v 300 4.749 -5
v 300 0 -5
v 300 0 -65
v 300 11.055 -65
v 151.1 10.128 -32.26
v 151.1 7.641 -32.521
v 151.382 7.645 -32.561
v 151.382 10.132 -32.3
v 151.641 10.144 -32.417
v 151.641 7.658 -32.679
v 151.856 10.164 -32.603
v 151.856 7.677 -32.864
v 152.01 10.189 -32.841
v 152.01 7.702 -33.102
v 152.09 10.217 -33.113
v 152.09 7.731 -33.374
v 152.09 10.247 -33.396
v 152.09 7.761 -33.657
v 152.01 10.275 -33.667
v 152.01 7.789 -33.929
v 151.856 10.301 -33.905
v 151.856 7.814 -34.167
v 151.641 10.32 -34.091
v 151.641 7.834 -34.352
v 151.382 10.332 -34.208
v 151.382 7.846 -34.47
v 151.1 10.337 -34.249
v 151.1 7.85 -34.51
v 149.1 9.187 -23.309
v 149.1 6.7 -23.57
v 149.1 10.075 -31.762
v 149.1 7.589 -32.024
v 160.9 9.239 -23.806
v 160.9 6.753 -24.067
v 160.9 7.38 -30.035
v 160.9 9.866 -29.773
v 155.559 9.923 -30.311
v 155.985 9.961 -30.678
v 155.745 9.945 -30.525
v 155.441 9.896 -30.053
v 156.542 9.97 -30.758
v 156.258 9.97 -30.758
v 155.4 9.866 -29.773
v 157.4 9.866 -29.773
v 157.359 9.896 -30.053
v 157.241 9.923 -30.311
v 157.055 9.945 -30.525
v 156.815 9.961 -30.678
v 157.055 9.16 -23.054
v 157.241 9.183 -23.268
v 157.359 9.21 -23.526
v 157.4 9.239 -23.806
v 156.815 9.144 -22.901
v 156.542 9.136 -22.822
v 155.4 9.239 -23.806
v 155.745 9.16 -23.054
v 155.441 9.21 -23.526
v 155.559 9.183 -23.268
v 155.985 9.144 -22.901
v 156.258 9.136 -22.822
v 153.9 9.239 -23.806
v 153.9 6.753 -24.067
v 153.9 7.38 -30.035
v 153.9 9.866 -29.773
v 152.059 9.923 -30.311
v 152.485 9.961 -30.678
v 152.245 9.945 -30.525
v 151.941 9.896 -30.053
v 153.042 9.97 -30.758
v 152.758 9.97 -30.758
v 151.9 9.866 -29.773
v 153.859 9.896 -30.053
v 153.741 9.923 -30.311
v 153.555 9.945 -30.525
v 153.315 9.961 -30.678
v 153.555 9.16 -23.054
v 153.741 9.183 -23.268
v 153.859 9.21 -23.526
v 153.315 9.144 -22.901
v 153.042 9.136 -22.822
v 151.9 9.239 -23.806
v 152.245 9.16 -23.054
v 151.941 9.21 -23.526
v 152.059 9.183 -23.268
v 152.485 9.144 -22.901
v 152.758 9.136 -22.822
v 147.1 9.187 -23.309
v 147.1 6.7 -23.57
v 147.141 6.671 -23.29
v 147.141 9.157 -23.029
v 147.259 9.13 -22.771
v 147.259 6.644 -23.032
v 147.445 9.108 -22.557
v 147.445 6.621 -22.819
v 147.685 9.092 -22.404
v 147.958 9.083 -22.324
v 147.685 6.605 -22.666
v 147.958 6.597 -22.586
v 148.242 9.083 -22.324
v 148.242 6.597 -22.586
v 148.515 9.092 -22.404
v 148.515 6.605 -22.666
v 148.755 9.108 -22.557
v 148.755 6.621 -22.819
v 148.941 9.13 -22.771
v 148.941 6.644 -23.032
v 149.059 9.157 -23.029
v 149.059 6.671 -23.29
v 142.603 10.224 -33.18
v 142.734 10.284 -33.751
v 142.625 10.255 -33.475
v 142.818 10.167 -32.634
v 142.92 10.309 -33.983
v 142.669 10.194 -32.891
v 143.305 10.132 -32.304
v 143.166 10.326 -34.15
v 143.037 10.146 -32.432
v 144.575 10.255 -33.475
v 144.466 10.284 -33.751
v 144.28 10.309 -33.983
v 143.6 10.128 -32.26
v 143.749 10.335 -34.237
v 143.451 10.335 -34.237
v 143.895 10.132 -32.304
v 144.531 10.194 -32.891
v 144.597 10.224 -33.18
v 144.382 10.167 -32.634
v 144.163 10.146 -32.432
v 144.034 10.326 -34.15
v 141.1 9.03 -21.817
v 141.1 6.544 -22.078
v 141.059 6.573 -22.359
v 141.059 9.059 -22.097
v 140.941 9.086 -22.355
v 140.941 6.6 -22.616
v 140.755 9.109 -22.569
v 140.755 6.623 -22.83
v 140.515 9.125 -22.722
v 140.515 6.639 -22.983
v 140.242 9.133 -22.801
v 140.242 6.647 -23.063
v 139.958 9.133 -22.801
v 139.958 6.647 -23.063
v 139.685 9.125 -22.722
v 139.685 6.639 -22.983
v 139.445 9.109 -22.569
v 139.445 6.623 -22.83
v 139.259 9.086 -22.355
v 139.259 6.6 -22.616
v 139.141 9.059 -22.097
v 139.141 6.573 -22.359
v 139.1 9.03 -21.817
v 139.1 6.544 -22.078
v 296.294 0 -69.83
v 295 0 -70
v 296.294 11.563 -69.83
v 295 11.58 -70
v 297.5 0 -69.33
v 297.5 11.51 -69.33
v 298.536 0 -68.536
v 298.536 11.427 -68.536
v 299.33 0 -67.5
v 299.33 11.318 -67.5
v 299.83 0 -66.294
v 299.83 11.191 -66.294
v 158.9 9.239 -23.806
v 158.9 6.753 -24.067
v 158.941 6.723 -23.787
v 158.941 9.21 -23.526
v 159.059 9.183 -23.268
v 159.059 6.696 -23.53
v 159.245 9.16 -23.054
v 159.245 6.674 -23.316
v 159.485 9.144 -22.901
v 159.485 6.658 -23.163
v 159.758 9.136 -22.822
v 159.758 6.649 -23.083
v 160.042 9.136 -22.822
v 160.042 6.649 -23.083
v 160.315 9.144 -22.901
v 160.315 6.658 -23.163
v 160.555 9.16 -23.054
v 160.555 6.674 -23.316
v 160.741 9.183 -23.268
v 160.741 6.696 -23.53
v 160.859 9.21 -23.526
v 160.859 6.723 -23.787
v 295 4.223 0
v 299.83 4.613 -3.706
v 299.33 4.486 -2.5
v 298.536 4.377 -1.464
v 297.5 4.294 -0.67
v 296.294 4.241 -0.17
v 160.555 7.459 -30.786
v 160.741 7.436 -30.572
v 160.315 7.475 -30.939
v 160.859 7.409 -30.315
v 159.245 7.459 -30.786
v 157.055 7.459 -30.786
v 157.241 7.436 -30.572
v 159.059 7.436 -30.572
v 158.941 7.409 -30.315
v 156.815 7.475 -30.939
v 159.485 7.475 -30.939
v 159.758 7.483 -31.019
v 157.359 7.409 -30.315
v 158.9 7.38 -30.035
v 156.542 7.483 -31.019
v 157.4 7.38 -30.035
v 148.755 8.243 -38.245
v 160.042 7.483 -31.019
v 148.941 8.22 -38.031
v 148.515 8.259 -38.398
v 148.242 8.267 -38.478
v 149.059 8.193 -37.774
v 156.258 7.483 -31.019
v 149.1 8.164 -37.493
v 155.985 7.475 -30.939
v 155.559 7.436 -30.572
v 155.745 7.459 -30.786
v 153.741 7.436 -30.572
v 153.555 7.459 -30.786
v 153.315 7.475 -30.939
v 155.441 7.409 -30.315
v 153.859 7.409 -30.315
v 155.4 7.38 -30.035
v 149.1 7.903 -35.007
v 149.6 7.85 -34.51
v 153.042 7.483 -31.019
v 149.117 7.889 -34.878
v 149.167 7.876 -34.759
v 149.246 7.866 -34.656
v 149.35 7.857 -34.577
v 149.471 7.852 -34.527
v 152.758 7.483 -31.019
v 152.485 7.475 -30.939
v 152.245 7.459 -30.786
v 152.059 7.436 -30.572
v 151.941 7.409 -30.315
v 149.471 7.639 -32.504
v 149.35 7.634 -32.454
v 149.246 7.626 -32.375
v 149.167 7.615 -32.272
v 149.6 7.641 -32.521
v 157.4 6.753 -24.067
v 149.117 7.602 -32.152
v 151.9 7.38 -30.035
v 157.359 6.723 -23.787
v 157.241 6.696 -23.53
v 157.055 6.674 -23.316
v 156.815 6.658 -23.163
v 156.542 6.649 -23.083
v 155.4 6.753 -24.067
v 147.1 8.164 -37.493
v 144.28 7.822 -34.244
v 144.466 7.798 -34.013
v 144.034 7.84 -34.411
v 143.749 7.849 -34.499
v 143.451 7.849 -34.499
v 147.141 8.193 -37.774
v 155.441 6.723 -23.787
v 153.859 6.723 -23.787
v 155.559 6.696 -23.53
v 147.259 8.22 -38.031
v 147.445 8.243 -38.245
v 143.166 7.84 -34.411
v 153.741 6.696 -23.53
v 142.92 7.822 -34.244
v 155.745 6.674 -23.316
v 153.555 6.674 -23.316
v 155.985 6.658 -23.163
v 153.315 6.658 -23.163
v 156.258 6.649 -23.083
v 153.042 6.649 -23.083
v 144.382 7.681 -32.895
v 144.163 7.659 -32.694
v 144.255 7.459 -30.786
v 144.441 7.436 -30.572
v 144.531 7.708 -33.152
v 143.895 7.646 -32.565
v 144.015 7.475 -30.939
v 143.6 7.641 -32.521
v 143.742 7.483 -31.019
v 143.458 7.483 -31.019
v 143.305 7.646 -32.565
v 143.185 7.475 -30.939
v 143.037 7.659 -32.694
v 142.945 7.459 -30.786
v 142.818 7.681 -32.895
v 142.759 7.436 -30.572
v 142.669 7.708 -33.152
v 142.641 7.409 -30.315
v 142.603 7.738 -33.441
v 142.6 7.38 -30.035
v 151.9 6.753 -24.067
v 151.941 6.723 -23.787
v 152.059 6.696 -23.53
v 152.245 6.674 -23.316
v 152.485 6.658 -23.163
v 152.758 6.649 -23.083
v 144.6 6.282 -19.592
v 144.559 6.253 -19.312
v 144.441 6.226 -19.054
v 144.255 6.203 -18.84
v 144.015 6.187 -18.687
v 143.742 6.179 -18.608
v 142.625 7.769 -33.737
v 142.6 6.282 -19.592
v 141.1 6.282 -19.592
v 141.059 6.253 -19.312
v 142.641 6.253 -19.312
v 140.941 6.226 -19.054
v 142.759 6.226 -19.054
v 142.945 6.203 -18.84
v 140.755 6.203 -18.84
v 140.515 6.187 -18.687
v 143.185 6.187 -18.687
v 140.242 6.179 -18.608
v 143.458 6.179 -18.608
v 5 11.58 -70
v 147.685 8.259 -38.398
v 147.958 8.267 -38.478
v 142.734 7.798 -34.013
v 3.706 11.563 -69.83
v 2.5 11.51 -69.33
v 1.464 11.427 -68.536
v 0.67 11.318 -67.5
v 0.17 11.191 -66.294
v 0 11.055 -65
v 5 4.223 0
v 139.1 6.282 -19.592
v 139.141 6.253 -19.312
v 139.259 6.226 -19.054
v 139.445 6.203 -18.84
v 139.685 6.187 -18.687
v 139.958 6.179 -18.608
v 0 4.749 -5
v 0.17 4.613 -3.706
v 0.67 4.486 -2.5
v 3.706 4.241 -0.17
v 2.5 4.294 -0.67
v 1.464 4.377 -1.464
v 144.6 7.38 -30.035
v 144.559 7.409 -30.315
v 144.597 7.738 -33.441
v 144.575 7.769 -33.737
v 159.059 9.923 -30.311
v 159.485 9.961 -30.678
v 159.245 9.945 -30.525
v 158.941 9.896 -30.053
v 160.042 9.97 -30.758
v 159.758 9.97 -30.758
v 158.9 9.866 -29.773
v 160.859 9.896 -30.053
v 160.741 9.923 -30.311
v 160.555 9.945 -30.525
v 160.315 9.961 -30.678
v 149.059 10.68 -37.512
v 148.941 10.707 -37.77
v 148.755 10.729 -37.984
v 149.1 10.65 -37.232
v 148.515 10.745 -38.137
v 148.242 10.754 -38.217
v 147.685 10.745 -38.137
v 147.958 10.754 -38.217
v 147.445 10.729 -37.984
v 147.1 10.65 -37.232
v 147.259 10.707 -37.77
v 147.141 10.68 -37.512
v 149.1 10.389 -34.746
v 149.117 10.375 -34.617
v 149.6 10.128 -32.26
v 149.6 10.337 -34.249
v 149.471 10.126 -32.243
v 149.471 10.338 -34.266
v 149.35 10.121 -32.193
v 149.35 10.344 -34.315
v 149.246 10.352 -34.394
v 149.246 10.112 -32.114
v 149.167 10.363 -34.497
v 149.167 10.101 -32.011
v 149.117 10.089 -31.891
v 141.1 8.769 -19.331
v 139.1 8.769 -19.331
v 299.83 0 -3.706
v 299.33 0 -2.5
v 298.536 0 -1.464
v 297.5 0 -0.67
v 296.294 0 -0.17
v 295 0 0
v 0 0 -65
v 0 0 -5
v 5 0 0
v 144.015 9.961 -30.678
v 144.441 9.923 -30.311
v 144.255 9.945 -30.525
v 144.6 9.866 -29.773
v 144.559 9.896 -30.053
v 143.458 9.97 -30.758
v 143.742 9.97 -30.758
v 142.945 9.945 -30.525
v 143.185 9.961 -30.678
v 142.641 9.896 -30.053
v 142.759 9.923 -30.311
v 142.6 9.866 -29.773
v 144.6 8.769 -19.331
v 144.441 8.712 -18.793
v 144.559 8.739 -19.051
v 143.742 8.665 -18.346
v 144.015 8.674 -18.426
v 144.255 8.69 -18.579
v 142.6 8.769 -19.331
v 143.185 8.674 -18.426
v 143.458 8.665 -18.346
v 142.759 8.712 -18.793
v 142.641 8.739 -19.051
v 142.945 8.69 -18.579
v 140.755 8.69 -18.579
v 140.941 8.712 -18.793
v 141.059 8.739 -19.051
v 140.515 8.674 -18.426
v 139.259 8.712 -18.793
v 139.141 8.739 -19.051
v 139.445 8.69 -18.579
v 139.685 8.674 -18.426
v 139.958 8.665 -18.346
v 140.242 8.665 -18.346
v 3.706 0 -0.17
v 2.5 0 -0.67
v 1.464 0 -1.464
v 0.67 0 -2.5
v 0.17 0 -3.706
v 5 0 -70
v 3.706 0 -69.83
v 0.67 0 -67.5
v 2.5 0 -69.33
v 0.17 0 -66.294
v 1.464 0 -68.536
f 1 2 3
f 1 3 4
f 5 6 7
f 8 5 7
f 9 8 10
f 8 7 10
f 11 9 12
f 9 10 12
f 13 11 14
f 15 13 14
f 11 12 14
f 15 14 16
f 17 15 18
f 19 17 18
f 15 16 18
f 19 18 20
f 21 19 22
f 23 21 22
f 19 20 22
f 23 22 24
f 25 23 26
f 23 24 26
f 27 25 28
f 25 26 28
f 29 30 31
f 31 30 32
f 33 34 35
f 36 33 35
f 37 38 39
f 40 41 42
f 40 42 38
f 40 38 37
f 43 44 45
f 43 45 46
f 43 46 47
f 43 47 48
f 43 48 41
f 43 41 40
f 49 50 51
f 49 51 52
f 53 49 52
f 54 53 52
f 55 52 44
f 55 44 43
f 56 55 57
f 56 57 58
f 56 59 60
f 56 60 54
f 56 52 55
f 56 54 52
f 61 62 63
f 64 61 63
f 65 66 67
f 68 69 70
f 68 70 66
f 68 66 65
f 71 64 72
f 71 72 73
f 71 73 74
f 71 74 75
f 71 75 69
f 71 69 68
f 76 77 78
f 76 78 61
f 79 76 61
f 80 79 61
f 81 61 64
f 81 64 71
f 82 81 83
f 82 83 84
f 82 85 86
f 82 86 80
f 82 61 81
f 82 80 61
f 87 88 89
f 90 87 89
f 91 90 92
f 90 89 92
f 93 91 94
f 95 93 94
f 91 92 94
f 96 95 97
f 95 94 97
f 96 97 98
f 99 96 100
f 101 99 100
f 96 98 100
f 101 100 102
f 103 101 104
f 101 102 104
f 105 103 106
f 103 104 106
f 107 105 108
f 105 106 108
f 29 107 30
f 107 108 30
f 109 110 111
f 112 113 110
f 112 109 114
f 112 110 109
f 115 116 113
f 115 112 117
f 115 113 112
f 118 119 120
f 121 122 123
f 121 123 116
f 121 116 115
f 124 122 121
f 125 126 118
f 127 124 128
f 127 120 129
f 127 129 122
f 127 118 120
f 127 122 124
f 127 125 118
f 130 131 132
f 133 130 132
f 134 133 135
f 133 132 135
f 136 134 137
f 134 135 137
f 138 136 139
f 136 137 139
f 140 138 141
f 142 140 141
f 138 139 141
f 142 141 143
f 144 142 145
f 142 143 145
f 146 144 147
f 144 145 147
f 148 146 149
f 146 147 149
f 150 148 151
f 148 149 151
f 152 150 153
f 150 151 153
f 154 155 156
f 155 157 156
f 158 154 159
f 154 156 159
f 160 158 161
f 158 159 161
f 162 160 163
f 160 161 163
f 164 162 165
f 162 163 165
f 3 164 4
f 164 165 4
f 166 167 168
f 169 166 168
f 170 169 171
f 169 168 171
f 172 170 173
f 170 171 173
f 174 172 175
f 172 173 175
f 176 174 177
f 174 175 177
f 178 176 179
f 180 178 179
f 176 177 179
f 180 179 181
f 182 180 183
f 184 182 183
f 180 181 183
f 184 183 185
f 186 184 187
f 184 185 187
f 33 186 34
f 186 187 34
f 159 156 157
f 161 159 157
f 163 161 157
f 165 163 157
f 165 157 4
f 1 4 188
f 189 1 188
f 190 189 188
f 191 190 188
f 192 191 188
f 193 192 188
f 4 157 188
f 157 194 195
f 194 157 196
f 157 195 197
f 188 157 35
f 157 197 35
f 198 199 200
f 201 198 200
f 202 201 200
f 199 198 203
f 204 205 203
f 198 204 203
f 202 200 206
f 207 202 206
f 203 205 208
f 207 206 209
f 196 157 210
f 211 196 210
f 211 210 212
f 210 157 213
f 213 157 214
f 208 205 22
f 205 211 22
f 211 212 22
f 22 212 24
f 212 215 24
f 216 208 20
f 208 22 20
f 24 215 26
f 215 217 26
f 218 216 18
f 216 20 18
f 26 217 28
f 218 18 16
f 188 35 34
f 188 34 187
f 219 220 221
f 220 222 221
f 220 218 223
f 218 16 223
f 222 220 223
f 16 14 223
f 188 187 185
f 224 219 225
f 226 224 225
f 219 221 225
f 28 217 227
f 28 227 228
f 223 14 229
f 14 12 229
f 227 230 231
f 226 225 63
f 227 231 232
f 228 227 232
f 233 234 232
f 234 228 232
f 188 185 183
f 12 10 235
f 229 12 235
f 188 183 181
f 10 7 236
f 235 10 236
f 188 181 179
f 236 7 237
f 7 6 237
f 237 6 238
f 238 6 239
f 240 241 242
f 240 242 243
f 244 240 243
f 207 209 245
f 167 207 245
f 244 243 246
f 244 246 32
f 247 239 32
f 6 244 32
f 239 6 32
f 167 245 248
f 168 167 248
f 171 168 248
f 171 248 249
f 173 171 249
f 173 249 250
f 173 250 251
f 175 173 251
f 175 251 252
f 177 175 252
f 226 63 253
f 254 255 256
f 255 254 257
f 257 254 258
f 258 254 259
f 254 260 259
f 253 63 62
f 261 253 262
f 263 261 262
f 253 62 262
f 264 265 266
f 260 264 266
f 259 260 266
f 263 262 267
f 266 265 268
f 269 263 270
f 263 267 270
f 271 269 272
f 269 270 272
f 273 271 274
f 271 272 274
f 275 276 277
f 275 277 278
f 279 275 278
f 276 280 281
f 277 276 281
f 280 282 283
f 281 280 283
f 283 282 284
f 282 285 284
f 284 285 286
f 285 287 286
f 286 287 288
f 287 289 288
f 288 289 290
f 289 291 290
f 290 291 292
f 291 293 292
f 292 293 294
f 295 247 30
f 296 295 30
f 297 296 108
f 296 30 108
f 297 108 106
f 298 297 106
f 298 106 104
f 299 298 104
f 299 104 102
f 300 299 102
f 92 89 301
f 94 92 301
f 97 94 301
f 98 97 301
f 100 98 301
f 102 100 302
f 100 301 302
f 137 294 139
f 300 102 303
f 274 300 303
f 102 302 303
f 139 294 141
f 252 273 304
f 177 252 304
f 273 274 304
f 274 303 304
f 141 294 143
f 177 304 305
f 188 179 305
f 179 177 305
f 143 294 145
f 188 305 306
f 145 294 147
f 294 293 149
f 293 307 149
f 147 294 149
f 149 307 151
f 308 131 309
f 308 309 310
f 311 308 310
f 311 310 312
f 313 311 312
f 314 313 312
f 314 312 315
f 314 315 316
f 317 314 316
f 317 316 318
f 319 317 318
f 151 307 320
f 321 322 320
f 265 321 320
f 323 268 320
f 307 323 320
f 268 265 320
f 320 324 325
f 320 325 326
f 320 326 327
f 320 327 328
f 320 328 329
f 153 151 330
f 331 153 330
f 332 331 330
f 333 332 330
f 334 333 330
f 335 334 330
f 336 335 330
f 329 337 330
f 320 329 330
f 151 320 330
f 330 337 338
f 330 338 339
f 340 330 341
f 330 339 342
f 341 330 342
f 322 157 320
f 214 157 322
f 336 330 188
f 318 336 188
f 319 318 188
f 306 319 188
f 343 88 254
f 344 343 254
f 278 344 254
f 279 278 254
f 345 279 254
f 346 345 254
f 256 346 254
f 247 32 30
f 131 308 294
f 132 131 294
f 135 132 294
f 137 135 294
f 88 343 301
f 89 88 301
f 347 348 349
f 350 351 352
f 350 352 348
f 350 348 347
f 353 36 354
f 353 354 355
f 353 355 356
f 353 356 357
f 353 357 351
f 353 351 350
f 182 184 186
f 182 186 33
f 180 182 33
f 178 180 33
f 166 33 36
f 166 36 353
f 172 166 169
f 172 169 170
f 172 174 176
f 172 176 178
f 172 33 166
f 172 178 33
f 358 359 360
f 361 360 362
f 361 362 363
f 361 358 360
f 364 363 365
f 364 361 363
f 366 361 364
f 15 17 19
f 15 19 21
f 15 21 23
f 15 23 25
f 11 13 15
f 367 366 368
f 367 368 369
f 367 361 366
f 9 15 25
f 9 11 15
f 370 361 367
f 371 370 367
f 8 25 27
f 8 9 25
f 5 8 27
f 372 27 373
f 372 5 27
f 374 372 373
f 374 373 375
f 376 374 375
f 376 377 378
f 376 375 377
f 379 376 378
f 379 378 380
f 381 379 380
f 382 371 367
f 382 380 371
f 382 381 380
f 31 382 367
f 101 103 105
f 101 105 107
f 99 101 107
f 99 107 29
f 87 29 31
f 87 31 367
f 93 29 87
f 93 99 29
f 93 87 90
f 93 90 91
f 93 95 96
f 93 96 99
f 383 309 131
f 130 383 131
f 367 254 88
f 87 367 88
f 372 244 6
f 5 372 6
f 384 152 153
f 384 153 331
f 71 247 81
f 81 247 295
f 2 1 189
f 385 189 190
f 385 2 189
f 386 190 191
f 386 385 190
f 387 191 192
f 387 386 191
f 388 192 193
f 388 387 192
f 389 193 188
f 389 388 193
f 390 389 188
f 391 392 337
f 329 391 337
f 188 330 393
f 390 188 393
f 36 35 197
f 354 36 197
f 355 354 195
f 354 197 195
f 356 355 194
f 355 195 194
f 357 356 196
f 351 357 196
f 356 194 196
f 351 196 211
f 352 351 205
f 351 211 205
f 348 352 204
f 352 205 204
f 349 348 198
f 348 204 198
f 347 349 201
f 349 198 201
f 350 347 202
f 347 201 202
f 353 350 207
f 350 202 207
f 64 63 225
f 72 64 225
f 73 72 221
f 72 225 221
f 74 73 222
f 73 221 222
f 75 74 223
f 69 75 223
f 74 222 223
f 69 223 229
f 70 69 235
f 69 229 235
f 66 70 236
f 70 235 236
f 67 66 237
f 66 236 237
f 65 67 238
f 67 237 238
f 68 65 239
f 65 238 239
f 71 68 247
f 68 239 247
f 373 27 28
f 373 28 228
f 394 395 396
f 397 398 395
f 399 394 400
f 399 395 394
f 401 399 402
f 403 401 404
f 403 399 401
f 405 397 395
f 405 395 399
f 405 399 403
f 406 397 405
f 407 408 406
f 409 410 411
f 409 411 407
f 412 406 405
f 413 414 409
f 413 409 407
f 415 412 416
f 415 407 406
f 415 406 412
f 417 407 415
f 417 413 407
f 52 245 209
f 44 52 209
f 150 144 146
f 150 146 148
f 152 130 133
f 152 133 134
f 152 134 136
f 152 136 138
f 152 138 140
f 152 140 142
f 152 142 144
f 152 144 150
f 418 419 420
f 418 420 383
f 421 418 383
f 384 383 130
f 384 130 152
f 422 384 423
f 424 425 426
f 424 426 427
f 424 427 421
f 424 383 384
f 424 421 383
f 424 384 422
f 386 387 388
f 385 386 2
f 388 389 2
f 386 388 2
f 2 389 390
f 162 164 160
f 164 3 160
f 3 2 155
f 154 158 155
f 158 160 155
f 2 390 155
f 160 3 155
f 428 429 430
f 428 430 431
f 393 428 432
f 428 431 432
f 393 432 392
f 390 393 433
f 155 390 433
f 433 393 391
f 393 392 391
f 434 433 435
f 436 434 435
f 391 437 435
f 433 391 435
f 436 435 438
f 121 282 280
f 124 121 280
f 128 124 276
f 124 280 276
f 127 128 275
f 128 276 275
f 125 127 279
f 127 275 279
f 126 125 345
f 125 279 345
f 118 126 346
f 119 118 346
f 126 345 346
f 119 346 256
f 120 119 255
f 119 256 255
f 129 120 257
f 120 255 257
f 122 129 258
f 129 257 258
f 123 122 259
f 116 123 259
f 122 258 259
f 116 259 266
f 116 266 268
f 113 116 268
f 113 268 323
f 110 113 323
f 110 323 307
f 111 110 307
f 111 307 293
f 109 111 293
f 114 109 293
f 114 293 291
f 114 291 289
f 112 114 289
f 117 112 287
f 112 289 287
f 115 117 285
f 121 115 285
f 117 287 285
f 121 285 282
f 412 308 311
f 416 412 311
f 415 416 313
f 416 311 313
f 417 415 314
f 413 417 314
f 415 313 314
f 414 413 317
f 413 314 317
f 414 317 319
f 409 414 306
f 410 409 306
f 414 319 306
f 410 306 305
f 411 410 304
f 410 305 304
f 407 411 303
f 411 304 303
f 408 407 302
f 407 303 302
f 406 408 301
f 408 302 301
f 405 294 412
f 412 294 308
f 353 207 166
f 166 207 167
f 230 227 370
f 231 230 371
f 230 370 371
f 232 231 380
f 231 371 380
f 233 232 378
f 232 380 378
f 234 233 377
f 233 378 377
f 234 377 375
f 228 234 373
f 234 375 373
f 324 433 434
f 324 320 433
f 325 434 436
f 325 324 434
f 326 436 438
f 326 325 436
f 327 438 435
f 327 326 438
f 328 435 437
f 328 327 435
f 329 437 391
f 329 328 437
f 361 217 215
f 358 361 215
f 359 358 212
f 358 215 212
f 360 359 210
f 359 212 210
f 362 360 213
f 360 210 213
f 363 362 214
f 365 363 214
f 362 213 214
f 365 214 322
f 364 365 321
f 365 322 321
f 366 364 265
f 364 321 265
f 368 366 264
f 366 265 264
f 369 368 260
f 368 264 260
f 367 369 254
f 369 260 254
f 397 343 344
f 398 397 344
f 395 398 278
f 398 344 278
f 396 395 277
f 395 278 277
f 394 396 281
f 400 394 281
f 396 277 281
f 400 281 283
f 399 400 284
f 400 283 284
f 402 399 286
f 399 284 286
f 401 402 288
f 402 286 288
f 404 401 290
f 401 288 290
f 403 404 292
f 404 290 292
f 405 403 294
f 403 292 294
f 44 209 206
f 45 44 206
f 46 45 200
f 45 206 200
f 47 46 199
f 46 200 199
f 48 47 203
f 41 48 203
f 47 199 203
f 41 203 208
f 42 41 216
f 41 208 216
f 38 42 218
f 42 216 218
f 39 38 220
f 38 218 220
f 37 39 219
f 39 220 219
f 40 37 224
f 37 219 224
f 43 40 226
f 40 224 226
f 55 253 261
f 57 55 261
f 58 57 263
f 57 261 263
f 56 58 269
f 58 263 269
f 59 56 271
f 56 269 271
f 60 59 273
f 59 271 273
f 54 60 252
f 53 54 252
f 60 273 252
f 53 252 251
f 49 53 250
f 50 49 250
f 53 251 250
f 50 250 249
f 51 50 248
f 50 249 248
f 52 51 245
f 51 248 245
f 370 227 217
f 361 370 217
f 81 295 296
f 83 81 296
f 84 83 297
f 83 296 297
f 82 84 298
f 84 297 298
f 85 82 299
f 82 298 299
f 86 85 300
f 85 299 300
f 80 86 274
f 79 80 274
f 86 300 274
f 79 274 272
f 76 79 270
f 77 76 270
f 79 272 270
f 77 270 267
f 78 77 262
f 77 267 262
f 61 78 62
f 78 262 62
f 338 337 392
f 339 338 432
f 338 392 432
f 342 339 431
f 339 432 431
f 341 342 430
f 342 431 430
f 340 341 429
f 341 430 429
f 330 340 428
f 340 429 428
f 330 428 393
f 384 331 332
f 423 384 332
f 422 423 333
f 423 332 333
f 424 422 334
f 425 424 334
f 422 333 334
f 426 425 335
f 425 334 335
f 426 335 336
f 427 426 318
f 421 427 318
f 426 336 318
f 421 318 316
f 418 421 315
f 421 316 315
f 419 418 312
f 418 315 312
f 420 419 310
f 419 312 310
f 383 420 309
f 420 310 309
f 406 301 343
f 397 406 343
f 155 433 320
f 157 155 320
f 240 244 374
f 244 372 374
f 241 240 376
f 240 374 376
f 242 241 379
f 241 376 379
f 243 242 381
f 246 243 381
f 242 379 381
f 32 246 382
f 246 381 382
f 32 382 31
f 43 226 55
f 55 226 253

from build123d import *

# Parameters (mm, degrees)
BOSS_EXTRUDE1_REACH = 318.657
SKETCH1_W           = 300
SKETCH1_H           = 70
SKETCH2_R           = 1
BOSS_EXTRUDE2_DEPTH = 2.5
FILLET1_R           = 5
FILLET2_R           = 0.5


with BuildPart() as part:
    # Boss-Extrude1: up to this plane
    boss_extrude1_end = Plane(origin=(0, 4.176991961, 0.439019546), z_dir=(0, 0.9945218953682733, 0.10452846326765369))
    # Sketch1 → Boss-Extrude1 (new, up to the surface)
    with BuildSketch(Plane(origin=(0, 0, 0), x_dir=(1, 0, 0), z_dir=(0, 1, 0)), mode=Mode.PRIVATE) as boss_extrude1_sk1:
        with Locations((150, 35)):
            Rectangle(SKETCH1_W, SKETCH1_H)
    boss_extrude1_tool1 = split(extrude(boss_extrude1_sk1.sketch, amount=BOSS_EXTRUDE1_REACH, mode=Mode.PRIVATE), bisect_by=boss_extrude1_end, keep=Keep.BOTH, mode=Mode.PRIVATE)
    add(boss_extrude1_tool1.solids().sort_by_distance((150, 0, -35))[0])

    # Sketch2 → Boss-Extrude2 (add)
    with BuildSketch(Plane(origin=(0, 4.176991961, 0.439019546), x_dir=(-1, 0, 0), z_dir=(0, 0.9945218953682733, 0.10452846326765368))):
        with BuildLine():
            ThreePointArc((-149.1, -38.141437788), (-148.1, -39.141437788), (-147.1, -38.141437788))
            Line((-147.1, -38.141437788), (-147.1, -24.141437788))
            ThreePointArc((-147.1, -24.141437788), (-148.1, -23.141437788), (-149.1, -24.141437788))
            Line((-149.1, -24.141437788), (-149.1, -33.141437788))
            Line((-149.1, -33.141437788), (-151.1, -33.141437788))
            ThreePointArc((-151.1, -33.141437788), (-152.1, -34.141437788), (-151.1, -35.141437788))
            Line((-151.1, -35.141437788), (-149.1, -35.141437788))
            Line((-149.1, -35.141437788), (-149.1, -38.141437788))
        make_face()
        with BuildLine():
            ThreePointArc((-144.6, -30.641437788), (-143.6, -31.641437788), (-142.6, -30.641437788))
            Line((-142.6, -30.641437788), (-142.6, -20.141437788))
            ThreePointArc((-142.6, -20.141437788), (-143.6, -19.141437788), (-144.6, -20.141437788))
            Line((-144.6, -20.141437788), (-144.6, -30.641437788))
        make_face()
        with BuildLine():
            ThreePointArc((-153.9, -30.641437788), (-152.9, -31.641437788), (-151.9, -30.641437788))
            Line((-151.9, -30.641437788), (-151.9, -24.641437788))
            ThreePointArc((-151.9, -24.641437788), (-152.9, -23.641437788), (-153.9, -24.641437788))
            Line((-153.9, -24.641437788), (-153.9, -30.641437788))
        make_face()
        with BuildLine():
            ThreePointArc((-157.4, -30.641437788), (-156.4, -31.641437788), (-155.4, -30.641437788))
            Line((-155.4, -30.641437788), (-155.4, -24.641437788))
            ThreePointArc((-155.4, -24.641437788), (-156.4, -23.641437788), (-157.4, -24.641437788))
            Line((-157.4, -24.641437788), (-157.4, -30.641437788))
        make_face()
        with BuildLine():
            ThreePointArc((-160.9, -30.641437788), (-159.9, -31.641437788), (-158.9, -30.641437788))
            Line((-158.9, -30.641437788), (-158.9, -24.641437788))
            ThreePointArc((-158.9, -24.641437788), (-159.9, -23.641437788), (-160.9, -24.641437788))
            Line((-160.9, -24.641437788), (-160.9, -30.641437788))
        make_face()
        with BuildLine():
            ThreePointArc((-141.1, -22.641437788), (-140.1, -23.641437788), (-139.1, -22.641437788))
            Line((-139.1, -22.641437788), (-139.1, -20.141437788))
            ThreePointArc((-139.1, -20.141437788), (-140.1, -19.141437788), (-141.1, -20.141437788))
            Line((-141.1, -20.141437788), (-141.1, -22.641437788))
        make_face()
        with Locations((-143.6, -34.141437788)):
            Circle(SKETCH2_R)
    extrude(amount=BOSS_EXTRUDE2_DEPTH)

    # Fillet1
    fillet1_edges = [part.edges().sort_by_distance(p)[0] for p in [
        (300, 5.790215621, -70),
        (300, 2.111567387, 0),
        (0, 2.111567387, 0),
        (0, 5.790215621, -70),
    ]]
    fillet(fillet1_edges, radius=FILLET1_R)

    # Fillet2
    fillet2_edges = [part.edges().sort_by_distance(p)[0] for p in [
        (149.1, 9.093424819, -34.37924919),
        (149.1, 8.884367892, -32.390205399),
    ]]
    fillet(fillet2_edges, radius=FILLET2_R)


solid = part.part
